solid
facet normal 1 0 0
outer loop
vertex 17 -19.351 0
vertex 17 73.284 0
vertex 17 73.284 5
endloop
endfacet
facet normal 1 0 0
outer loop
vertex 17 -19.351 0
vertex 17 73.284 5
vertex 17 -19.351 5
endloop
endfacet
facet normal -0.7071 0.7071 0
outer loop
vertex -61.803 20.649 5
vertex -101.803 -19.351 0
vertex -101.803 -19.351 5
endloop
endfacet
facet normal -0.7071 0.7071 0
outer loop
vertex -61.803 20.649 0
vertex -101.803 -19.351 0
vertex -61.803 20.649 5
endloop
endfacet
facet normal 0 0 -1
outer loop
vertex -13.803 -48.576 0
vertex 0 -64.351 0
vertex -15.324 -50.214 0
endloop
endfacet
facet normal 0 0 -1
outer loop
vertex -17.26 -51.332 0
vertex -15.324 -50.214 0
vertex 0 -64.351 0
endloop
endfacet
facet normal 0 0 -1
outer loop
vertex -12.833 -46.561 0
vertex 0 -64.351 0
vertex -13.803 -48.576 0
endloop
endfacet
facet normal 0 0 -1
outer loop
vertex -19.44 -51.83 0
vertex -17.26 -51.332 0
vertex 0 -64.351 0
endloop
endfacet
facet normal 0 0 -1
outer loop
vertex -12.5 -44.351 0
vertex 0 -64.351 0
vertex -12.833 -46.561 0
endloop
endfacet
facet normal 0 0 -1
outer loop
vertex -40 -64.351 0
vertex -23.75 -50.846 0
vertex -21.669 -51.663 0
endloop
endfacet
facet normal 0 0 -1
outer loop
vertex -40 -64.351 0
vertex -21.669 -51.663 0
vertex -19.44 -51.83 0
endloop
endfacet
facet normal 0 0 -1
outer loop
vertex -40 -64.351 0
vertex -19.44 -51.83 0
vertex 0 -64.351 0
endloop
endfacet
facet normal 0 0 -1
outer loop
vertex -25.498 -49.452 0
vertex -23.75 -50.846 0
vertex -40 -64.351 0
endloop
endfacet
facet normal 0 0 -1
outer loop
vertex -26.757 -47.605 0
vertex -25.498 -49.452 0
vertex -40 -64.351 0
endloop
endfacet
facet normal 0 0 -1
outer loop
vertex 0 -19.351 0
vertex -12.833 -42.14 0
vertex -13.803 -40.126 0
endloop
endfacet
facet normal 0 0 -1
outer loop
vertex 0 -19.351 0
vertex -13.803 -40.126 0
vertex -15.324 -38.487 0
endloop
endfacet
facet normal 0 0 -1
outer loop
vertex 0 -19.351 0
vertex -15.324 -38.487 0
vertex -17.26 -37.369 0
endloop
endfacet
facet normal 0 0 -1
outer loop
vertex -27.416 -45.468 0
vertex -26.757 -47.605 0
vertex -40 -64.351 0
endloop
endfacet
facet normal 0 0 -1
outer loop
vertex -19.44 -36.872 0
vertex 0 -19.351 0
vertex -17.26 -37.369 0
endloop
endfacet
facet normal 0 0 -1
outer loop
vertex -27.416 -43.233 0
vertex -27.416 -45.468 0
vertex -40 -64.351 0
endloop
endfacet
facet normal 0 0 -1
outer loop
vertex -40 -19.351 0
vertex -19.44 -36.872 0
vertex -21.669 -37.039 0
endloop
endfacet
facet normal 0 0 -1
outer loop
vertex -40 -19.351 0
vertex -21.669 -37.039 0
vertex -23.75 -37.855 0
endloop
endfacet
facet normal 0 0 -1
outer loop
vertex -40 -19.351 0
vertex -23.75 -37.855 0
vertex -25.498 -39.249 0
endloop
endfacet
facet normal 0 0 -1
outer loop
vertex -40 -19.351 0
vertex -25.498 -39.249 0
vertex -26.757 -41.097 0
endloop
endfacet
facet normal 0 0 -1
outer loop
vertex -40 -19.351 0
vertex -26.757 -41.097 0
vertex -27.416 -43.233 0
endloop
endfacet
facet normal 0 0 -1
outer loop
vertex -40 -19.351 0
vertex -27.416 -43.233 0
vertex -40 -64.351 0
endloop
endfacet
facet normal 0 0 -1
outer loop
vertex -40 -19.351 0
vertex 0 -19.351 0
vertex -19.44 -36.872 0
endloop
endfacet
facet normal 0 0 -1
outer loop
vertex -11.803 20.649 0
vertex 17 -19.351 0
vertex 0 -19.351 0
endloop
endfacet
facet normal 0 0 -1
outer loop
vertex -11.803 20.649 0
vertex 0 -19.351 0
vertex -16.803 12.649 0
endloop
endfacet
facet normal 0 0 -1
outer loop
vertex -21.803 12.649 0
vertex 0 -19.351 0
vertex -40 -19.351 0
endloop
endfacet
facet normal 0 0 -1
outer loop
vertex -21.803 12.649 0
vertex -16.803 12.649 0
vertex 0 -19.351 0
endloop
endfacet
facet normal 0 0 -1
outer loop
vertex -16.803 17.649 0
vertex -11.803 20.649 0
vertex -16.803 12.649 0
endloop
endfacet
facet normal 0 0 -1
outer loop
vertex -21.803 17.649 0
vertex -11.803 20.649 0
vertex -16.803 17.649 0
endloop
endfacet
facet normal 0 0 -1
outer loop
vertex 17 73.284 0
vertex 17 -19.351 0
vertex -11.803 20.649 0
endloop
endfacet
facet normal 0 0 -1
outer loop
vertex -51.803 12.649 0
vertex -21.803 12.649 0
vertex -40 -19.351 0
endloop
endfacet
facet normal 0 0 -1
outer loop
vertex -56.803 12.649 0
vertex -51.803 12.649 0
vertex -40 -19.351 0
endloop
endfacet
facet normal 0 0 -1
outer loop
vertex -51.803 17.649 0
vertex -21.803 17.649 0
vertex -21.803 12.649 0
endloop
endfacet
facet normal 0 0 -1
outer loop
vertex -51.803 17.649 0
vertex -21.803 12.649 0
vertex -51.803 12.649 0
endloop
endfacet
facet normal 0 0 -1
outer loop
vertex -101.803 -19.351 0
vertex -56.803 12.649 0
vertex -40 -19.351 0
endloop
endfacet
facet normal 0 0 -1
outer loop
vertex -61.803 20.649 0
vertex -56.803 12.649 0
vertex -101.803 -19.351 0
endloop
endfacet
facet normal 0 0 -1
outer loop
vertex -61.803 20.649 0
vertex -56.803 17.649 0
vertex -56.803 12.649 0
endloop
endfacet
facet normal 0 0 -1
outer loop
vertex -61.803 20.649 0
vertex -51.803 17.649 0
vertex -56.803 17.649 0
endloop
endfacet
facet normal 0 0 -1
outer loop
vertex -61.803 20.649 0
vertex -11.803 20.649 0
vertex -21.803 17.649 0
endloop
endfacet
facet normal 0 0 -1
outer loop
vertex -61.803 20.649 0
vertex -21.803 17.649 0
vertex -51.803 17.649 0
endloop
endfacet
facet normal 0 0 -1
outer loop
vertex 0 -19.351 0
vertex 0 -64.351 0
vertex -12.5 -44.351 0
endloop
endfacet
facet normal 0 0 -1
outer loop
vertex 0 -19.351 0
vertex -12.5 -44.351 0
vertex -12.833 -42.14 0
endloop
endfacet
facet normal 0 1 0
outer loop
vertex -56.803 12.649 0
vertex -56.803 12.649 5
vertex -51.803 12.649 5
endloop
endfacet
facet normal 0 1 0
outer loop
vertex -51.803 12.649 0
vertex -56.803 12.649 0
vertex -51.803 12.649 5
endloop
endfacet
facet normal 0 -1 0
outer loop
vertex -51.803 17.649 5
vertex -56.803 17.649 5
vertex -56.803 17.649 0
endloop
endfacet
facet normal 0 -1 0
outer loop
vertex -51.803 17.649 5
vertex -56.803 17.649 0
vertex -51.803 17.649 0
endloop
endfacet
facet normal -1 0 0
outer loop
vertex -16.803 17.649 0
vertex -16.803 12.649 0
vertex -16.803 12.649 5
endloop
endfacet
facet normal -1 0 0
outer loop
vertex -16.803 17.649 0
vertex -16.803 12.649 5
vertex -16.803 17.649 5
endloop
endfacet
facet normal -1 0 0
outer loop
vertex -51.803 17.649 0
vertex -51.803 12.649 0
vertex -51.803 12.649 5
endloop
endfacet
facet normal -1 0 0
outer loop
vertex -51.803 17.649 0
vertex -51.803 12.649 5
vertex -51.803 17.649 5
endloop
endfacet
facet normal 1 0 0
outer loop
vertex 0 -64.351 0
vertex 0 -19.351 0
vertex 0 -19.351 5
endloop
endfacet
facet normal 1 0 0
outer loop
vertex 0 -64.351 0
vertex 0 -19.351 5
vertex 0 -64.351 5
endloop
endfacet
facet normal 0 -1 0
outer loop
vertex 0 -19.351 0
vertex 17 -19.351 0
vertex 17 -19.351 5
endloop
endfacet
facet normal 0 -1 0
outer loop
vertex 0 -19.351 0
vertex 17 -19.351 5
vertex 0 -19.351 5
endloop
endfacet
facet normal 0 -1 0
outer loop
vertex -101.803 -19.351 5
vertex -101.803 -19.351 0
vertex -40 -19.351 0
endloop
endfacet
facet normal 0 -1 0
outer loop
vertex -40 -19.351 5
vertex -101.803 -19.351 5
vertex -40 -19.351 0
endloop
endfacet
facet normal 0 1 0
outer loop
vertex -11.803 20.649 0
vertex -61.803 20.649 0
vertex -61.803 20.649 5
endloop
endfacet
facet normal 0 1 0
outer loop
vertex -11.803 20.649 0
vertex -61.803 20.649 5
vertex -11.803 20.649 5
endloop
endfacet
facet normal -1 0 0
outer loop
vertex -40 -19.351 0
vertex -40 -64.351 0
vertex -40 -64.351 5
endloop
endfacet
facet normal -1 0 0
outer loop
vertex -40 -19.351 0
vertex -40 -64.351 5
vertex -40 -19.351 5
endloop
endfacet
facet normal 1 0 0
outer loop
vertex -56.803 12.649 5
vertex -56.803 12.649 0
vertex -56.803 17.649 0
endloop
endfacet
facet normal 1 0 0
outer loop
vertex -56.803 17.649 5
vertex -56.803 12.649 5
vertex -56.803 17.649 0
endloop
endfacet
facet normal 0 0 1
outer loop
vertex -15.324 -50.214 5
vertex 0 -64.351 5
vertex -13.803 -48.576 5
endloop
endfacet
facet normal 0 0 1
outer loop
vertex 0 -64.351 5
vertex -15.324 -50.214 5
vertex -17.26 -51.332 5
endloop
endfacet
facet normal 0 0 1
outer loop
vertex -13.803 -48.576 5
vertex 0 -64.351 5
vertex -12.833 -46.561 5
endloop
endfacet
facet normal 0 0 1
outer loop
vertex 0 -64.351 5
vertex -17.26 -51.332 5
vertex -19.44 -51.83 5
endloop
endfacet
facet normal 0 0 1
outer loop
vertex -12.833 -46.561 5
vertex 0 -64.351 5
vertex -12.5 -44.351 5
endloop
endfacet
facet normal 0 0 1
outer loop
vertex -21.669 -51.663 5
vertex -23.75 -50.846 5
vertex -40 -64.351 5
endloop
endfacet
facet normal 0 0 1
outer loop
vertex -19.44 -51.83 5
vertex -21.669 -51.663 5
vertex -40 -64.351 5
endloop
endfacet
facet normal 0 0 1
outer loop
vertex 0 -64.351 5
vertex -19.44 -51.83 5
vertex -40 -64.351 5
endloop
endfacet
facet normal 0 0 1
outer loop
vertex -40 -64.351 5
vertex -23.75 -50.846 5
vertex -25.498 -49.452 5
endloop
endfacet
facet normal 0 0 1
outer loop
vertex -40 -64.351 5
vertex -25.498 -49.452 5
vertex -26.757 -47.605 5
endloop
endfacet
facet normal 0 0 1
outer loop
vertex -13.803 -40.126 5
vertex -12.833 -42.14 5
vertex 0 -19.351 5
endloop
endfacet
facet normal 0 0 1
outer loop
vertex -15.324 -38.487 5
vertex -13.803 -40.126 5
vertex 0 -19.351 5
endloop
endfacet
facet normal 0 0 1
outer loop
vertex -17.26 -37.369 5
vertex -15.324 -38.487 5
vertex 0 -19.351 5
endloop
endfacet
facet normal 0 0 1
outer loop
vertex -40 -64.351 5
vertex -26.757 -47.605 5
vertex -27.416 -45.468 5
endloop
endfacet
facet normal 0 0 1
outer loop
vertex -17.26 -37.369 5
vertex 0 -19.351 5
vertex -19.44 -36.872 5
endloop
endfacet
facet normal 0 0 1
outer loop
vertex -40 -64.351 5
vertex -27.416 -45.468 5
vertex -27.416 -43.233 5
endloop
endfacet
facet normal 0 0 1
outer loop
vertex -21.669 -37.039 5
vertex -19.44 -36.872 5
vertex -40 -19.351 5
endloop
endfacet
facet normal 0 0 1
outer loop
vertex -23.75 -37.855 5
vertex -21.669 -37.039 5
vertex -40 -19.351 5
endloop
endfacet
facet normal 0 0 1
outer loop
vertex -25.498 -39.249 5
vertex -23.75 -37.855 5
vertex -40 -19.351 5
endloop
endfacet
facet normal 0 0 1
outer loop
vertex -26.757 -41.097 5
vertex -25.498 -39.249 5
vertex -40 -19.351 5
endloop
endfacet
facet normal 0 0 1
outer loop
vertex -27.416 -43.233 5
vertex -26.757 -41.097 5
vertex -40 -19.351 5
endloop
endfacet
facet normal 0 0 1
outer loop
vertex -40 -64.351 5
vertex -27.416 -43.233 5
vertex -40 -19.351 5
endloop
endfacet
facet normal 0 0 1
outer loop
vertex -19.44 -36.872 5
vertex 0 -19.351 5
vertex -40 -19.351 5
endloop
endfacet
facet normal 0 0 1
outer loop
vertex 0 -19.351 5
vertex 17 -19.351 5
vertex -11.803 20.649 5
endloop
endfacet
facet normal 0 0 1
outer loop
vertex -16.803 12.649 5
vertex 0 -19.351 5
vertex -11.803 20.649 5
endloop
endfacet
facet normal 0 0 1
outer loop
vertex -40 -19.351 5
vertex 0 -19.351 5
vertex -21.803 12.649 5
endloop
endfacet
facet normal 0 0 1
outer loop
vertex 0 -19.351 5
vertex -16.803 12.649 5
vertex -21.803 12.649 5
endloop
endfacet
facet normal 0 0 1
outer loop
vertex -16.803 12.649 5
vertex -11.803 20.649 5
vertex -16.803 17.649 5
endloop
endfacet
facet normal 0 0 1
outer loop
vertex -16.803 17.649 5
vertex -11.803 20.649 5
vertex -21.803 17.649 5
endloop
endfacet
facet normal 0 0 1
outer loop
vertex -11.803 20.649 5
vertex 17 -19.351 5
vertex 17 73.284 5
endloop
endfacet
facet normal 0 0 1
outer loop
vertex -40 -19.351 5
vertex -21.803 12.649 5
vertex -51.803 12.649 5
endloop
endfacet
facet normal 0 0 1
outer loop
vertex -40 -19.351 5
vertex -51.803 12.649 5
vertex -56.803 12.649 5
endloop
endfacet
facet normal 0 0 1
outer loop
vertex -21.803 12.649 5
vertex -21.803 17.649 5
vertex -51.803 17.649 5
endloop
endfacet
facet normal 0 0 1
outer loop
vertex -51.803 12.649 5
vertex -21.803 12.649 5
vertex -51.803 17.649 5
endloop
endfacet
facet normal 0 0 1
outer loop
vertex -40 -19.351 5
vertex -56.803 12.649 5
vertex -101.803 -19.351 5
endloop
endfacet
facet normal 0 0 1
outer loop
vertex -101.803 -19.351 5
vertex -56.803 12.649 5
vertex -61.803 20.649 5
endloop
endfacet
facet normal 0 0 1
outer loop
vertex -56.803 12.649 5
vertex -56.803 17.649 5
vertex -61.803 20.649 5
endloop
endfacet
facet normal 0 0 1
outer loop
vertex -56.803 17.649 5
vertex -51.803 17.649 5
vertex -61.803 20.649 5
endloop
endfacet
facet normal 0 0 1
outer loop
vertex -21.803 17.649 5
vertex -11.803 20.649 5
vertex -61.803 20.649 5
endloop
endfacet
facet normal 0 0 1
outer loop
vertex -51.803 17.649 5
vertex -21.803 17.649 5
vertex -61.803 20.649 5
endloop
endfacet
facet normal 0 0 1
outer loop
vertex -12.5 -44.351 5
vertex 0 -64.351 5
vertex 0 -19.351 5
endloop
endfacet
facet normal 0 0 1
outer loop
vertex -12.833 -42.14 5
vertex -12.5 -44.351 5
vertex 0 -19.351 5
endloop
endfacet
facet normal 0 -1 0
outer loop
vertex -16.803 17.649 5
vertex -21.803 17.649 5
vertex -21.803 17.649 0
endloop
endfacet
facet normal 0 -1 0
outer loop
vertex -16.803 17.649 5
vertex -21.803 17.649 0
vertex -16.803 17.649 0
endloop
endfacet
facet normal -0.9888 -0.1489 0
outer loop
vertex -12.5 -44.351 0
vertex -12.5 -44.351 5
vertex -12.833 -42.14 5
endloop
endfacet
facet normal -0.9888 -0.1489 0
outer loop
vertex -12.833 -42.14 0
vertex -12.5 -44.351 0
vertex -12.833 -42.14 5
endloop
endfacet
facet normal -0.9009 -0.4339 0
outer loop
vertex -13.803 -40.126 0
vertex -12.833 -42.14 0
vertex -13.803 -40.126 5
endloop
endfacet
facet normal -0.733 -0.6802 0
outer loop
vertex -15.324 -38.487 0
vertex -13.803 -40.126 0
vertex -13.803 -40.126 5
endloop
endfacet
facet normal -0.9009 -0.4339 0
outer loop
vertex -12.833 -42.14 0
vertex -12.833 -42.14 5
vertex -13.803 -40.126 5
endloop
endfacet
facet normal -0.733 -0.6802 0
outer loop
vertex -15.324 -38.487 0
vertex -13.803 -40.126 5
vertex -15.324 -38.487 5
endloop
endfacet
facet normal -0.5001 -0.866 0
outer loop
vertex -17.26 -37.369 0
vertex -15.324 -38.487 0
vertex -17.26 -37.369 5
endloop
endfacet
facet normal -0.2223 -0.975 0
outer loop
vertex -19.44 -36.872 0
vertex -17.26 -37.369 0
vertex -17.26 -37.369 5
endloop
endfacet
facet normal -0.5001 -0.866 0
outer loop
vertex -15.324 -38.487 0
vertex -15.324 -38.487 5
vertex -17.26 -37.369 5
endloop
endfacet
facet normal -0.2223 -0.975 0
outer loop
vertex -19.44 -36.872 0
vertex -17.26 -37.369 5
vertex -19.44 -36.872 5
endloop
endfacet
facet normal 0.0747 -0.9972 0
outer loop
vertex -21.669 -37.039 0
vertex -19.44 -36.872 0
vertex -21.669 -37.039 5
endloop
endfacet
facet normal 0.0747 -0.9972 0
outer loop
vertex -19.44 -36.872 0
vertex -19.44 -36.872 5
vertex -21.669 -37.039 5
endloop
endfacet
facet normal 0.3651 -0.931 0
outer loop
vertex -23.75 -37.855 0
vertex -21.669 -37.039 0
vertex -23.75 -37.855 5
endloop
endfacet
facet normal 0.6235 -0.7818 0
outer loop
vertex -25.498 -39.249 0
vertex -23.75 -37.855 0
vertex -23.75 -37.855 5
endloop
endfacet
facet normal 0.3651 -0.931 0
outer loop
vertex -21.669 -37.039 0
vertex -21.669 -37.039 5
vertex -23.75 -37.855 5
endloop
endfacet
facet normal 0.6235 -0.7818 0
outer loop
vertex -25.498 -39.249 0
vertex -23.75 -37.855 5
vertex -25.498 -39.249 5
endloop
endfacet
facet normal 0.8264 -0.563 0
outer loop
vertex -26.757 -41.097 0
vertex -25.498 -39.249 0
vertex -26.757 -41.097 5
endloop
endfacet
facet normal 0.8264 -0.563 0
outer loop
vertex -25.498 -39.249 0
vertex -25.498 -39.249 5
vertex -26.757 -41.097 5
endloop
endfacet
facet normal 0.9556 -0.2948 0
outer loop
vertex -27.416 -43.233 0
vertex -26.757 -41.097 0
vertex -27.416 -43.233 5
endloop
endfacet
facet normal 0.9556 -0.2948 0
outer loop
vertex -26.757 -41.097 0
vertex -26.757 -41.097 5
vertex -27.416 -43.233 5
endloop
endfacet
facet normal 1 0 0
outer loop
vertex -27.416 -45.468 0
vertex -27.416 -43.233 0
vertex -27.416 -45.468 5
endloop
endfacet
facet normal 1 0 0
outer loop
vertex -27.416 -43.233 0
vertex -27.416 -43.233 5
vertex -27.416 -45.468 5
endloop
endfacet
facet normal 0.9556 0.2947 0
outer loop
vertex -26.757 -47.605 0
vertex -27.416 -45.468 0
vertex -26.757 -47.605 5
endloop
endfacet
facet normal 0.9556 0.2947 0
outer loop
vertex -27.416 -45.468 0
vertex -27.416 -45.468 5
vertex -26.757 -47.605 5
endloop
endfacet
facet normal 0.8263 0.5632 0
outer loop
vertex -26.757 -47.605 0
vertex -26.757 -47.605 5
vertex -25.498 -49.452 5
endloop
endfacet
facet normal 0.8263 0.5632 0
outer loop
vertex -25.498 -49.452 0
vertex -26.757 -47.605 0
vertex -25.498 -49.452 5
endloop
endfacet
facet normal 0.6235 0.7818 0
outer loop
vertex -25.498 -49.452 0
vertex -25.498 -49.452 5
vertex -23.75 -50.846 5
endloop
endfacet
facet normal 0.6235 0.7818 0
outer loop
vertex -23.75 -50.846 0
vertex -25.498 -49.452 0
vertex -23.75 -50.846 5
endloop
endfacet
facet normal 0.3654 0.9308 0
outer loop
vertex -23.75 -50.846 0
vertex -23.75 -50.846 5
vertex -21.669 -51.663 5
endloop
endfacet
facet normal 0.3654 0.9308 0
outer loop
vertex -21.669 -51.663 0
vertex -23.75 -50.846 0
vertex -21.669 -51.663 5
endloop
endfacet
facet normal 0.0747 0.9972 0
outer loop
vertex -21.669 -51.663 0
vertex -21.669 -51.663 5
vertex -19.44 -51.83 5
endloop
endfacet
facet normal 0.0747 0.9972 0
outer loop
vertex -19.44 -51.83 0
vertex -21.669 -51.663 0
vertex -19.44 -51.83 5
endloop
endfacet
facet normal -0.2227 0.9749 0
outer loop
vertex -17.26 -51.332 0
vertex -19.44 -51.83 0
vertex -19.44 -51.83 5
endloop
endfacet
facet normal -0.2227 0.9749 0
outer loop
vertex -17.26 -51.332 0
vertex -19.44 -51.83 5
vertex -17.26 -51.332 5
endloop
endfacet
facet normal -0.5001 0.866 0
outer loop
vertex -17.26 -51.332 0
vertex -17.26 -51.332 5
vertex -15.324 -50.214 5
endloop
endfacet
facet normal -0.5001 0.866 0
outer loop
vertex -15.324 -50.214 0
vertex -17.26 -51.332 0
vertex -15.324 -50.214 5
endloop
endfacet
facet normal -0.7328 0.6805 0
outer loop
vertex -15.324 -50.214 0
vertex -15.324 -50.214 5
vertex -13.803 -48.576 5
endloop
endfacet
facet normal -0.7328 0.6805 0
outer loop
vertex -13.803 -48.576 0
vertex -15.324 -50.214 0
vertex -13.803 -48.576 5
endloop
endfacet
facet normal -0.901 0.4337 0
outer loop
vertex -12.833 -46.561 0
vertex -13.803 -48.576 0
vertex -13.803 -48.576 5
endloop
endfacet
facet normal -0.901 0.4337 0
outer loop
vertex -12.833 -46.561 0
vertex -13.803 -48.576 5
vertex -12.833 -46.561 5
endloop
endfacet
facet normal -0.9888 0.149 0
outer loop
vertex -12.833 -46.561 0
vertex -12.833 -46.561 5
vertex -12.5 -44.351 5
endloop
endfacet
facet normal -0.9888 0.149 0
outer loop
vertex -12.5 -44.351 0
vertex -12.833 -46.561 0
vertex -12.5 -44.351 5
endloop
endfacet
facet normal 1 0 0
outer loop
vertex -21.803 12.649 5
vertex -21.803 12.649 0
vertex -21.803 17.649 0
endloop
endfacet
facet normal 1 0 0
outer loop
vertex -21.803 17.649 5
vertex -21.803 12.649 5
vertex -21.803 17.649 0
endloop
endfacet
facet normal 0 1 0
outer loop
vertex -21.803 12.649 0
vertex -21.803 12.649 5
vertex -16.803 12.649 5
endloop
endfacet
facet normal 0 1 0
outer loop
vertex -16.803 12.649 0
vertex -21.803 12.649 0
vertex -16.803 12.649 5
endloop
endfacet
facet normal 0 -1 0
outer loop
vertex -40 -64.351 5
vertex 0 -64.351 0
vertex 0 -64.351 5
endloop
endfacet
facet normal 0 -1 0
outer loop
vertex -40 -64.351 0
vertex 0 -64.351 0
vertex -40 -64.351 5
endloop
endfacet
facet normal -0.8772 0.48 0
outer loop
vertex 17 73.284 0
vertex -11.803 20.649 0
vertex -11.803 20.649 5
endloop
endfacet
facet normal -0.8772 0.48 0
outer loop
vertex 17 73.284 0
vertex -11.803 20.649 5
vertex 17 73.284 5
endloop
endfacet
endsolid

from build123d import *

# Parameters (mm, degrees)
BOSS_EXTRUDE1_DEPTH = 5
SKETCH3_W           = 5
SKETCH3_H           = 5
CUT_EXTRUDE1_DEPTH  = 5
SKETCH4_R           = 7.5
CUT_EXTRUDE2_DEPTH  = 10


with BuildPart() as part:
    # Sketch2 → Boss-Extrude1 (new body)
    with BuildSketch(Plane.XY):
        Polygon((-61.802768985, 20.649350649), (-11.802768985, 20.649350649), (17, 73.283944775), (17, -19.350649351), (0, -19.350649351), (0, -64.350649351), (-40, -64.350649351), (-40, -19.350649351), (-61.802768985, -19.350649351), (-101.802768985, -19.350649351), align=None)
    extrude(amount=BOSS_EXTRUDE1_DEPTH)

    # Sketch3 → Cut-Extrude1 (cut)
    with BuildSketch(Plane.XY.offset(5)):
        with Locations((-54.302768985, 15.149350649)):
            Rectangle(SKETCH3_W, SKETCH3_H)
        with Locations((-19.302768985, 15.149350649)):
            Rectangle(SKETCH3_W, SKETCH3_H)
    extrude(amount=-CUT_EXTRUDE1_DEPTH, mode=Mode.SUBTRACT)

    # Sketch4 → Cut-Extrude2 (cut)
    with BuildSketch(Plane.XY.offset(5)):
        with Locations((-20, -44.350649351)):
            Circle(SKETCH4_R)
    extrude(amount=-CUT_EXTRUDE2_DEPTH, mode=Mode.SUBTRACT)


solid = part.part
